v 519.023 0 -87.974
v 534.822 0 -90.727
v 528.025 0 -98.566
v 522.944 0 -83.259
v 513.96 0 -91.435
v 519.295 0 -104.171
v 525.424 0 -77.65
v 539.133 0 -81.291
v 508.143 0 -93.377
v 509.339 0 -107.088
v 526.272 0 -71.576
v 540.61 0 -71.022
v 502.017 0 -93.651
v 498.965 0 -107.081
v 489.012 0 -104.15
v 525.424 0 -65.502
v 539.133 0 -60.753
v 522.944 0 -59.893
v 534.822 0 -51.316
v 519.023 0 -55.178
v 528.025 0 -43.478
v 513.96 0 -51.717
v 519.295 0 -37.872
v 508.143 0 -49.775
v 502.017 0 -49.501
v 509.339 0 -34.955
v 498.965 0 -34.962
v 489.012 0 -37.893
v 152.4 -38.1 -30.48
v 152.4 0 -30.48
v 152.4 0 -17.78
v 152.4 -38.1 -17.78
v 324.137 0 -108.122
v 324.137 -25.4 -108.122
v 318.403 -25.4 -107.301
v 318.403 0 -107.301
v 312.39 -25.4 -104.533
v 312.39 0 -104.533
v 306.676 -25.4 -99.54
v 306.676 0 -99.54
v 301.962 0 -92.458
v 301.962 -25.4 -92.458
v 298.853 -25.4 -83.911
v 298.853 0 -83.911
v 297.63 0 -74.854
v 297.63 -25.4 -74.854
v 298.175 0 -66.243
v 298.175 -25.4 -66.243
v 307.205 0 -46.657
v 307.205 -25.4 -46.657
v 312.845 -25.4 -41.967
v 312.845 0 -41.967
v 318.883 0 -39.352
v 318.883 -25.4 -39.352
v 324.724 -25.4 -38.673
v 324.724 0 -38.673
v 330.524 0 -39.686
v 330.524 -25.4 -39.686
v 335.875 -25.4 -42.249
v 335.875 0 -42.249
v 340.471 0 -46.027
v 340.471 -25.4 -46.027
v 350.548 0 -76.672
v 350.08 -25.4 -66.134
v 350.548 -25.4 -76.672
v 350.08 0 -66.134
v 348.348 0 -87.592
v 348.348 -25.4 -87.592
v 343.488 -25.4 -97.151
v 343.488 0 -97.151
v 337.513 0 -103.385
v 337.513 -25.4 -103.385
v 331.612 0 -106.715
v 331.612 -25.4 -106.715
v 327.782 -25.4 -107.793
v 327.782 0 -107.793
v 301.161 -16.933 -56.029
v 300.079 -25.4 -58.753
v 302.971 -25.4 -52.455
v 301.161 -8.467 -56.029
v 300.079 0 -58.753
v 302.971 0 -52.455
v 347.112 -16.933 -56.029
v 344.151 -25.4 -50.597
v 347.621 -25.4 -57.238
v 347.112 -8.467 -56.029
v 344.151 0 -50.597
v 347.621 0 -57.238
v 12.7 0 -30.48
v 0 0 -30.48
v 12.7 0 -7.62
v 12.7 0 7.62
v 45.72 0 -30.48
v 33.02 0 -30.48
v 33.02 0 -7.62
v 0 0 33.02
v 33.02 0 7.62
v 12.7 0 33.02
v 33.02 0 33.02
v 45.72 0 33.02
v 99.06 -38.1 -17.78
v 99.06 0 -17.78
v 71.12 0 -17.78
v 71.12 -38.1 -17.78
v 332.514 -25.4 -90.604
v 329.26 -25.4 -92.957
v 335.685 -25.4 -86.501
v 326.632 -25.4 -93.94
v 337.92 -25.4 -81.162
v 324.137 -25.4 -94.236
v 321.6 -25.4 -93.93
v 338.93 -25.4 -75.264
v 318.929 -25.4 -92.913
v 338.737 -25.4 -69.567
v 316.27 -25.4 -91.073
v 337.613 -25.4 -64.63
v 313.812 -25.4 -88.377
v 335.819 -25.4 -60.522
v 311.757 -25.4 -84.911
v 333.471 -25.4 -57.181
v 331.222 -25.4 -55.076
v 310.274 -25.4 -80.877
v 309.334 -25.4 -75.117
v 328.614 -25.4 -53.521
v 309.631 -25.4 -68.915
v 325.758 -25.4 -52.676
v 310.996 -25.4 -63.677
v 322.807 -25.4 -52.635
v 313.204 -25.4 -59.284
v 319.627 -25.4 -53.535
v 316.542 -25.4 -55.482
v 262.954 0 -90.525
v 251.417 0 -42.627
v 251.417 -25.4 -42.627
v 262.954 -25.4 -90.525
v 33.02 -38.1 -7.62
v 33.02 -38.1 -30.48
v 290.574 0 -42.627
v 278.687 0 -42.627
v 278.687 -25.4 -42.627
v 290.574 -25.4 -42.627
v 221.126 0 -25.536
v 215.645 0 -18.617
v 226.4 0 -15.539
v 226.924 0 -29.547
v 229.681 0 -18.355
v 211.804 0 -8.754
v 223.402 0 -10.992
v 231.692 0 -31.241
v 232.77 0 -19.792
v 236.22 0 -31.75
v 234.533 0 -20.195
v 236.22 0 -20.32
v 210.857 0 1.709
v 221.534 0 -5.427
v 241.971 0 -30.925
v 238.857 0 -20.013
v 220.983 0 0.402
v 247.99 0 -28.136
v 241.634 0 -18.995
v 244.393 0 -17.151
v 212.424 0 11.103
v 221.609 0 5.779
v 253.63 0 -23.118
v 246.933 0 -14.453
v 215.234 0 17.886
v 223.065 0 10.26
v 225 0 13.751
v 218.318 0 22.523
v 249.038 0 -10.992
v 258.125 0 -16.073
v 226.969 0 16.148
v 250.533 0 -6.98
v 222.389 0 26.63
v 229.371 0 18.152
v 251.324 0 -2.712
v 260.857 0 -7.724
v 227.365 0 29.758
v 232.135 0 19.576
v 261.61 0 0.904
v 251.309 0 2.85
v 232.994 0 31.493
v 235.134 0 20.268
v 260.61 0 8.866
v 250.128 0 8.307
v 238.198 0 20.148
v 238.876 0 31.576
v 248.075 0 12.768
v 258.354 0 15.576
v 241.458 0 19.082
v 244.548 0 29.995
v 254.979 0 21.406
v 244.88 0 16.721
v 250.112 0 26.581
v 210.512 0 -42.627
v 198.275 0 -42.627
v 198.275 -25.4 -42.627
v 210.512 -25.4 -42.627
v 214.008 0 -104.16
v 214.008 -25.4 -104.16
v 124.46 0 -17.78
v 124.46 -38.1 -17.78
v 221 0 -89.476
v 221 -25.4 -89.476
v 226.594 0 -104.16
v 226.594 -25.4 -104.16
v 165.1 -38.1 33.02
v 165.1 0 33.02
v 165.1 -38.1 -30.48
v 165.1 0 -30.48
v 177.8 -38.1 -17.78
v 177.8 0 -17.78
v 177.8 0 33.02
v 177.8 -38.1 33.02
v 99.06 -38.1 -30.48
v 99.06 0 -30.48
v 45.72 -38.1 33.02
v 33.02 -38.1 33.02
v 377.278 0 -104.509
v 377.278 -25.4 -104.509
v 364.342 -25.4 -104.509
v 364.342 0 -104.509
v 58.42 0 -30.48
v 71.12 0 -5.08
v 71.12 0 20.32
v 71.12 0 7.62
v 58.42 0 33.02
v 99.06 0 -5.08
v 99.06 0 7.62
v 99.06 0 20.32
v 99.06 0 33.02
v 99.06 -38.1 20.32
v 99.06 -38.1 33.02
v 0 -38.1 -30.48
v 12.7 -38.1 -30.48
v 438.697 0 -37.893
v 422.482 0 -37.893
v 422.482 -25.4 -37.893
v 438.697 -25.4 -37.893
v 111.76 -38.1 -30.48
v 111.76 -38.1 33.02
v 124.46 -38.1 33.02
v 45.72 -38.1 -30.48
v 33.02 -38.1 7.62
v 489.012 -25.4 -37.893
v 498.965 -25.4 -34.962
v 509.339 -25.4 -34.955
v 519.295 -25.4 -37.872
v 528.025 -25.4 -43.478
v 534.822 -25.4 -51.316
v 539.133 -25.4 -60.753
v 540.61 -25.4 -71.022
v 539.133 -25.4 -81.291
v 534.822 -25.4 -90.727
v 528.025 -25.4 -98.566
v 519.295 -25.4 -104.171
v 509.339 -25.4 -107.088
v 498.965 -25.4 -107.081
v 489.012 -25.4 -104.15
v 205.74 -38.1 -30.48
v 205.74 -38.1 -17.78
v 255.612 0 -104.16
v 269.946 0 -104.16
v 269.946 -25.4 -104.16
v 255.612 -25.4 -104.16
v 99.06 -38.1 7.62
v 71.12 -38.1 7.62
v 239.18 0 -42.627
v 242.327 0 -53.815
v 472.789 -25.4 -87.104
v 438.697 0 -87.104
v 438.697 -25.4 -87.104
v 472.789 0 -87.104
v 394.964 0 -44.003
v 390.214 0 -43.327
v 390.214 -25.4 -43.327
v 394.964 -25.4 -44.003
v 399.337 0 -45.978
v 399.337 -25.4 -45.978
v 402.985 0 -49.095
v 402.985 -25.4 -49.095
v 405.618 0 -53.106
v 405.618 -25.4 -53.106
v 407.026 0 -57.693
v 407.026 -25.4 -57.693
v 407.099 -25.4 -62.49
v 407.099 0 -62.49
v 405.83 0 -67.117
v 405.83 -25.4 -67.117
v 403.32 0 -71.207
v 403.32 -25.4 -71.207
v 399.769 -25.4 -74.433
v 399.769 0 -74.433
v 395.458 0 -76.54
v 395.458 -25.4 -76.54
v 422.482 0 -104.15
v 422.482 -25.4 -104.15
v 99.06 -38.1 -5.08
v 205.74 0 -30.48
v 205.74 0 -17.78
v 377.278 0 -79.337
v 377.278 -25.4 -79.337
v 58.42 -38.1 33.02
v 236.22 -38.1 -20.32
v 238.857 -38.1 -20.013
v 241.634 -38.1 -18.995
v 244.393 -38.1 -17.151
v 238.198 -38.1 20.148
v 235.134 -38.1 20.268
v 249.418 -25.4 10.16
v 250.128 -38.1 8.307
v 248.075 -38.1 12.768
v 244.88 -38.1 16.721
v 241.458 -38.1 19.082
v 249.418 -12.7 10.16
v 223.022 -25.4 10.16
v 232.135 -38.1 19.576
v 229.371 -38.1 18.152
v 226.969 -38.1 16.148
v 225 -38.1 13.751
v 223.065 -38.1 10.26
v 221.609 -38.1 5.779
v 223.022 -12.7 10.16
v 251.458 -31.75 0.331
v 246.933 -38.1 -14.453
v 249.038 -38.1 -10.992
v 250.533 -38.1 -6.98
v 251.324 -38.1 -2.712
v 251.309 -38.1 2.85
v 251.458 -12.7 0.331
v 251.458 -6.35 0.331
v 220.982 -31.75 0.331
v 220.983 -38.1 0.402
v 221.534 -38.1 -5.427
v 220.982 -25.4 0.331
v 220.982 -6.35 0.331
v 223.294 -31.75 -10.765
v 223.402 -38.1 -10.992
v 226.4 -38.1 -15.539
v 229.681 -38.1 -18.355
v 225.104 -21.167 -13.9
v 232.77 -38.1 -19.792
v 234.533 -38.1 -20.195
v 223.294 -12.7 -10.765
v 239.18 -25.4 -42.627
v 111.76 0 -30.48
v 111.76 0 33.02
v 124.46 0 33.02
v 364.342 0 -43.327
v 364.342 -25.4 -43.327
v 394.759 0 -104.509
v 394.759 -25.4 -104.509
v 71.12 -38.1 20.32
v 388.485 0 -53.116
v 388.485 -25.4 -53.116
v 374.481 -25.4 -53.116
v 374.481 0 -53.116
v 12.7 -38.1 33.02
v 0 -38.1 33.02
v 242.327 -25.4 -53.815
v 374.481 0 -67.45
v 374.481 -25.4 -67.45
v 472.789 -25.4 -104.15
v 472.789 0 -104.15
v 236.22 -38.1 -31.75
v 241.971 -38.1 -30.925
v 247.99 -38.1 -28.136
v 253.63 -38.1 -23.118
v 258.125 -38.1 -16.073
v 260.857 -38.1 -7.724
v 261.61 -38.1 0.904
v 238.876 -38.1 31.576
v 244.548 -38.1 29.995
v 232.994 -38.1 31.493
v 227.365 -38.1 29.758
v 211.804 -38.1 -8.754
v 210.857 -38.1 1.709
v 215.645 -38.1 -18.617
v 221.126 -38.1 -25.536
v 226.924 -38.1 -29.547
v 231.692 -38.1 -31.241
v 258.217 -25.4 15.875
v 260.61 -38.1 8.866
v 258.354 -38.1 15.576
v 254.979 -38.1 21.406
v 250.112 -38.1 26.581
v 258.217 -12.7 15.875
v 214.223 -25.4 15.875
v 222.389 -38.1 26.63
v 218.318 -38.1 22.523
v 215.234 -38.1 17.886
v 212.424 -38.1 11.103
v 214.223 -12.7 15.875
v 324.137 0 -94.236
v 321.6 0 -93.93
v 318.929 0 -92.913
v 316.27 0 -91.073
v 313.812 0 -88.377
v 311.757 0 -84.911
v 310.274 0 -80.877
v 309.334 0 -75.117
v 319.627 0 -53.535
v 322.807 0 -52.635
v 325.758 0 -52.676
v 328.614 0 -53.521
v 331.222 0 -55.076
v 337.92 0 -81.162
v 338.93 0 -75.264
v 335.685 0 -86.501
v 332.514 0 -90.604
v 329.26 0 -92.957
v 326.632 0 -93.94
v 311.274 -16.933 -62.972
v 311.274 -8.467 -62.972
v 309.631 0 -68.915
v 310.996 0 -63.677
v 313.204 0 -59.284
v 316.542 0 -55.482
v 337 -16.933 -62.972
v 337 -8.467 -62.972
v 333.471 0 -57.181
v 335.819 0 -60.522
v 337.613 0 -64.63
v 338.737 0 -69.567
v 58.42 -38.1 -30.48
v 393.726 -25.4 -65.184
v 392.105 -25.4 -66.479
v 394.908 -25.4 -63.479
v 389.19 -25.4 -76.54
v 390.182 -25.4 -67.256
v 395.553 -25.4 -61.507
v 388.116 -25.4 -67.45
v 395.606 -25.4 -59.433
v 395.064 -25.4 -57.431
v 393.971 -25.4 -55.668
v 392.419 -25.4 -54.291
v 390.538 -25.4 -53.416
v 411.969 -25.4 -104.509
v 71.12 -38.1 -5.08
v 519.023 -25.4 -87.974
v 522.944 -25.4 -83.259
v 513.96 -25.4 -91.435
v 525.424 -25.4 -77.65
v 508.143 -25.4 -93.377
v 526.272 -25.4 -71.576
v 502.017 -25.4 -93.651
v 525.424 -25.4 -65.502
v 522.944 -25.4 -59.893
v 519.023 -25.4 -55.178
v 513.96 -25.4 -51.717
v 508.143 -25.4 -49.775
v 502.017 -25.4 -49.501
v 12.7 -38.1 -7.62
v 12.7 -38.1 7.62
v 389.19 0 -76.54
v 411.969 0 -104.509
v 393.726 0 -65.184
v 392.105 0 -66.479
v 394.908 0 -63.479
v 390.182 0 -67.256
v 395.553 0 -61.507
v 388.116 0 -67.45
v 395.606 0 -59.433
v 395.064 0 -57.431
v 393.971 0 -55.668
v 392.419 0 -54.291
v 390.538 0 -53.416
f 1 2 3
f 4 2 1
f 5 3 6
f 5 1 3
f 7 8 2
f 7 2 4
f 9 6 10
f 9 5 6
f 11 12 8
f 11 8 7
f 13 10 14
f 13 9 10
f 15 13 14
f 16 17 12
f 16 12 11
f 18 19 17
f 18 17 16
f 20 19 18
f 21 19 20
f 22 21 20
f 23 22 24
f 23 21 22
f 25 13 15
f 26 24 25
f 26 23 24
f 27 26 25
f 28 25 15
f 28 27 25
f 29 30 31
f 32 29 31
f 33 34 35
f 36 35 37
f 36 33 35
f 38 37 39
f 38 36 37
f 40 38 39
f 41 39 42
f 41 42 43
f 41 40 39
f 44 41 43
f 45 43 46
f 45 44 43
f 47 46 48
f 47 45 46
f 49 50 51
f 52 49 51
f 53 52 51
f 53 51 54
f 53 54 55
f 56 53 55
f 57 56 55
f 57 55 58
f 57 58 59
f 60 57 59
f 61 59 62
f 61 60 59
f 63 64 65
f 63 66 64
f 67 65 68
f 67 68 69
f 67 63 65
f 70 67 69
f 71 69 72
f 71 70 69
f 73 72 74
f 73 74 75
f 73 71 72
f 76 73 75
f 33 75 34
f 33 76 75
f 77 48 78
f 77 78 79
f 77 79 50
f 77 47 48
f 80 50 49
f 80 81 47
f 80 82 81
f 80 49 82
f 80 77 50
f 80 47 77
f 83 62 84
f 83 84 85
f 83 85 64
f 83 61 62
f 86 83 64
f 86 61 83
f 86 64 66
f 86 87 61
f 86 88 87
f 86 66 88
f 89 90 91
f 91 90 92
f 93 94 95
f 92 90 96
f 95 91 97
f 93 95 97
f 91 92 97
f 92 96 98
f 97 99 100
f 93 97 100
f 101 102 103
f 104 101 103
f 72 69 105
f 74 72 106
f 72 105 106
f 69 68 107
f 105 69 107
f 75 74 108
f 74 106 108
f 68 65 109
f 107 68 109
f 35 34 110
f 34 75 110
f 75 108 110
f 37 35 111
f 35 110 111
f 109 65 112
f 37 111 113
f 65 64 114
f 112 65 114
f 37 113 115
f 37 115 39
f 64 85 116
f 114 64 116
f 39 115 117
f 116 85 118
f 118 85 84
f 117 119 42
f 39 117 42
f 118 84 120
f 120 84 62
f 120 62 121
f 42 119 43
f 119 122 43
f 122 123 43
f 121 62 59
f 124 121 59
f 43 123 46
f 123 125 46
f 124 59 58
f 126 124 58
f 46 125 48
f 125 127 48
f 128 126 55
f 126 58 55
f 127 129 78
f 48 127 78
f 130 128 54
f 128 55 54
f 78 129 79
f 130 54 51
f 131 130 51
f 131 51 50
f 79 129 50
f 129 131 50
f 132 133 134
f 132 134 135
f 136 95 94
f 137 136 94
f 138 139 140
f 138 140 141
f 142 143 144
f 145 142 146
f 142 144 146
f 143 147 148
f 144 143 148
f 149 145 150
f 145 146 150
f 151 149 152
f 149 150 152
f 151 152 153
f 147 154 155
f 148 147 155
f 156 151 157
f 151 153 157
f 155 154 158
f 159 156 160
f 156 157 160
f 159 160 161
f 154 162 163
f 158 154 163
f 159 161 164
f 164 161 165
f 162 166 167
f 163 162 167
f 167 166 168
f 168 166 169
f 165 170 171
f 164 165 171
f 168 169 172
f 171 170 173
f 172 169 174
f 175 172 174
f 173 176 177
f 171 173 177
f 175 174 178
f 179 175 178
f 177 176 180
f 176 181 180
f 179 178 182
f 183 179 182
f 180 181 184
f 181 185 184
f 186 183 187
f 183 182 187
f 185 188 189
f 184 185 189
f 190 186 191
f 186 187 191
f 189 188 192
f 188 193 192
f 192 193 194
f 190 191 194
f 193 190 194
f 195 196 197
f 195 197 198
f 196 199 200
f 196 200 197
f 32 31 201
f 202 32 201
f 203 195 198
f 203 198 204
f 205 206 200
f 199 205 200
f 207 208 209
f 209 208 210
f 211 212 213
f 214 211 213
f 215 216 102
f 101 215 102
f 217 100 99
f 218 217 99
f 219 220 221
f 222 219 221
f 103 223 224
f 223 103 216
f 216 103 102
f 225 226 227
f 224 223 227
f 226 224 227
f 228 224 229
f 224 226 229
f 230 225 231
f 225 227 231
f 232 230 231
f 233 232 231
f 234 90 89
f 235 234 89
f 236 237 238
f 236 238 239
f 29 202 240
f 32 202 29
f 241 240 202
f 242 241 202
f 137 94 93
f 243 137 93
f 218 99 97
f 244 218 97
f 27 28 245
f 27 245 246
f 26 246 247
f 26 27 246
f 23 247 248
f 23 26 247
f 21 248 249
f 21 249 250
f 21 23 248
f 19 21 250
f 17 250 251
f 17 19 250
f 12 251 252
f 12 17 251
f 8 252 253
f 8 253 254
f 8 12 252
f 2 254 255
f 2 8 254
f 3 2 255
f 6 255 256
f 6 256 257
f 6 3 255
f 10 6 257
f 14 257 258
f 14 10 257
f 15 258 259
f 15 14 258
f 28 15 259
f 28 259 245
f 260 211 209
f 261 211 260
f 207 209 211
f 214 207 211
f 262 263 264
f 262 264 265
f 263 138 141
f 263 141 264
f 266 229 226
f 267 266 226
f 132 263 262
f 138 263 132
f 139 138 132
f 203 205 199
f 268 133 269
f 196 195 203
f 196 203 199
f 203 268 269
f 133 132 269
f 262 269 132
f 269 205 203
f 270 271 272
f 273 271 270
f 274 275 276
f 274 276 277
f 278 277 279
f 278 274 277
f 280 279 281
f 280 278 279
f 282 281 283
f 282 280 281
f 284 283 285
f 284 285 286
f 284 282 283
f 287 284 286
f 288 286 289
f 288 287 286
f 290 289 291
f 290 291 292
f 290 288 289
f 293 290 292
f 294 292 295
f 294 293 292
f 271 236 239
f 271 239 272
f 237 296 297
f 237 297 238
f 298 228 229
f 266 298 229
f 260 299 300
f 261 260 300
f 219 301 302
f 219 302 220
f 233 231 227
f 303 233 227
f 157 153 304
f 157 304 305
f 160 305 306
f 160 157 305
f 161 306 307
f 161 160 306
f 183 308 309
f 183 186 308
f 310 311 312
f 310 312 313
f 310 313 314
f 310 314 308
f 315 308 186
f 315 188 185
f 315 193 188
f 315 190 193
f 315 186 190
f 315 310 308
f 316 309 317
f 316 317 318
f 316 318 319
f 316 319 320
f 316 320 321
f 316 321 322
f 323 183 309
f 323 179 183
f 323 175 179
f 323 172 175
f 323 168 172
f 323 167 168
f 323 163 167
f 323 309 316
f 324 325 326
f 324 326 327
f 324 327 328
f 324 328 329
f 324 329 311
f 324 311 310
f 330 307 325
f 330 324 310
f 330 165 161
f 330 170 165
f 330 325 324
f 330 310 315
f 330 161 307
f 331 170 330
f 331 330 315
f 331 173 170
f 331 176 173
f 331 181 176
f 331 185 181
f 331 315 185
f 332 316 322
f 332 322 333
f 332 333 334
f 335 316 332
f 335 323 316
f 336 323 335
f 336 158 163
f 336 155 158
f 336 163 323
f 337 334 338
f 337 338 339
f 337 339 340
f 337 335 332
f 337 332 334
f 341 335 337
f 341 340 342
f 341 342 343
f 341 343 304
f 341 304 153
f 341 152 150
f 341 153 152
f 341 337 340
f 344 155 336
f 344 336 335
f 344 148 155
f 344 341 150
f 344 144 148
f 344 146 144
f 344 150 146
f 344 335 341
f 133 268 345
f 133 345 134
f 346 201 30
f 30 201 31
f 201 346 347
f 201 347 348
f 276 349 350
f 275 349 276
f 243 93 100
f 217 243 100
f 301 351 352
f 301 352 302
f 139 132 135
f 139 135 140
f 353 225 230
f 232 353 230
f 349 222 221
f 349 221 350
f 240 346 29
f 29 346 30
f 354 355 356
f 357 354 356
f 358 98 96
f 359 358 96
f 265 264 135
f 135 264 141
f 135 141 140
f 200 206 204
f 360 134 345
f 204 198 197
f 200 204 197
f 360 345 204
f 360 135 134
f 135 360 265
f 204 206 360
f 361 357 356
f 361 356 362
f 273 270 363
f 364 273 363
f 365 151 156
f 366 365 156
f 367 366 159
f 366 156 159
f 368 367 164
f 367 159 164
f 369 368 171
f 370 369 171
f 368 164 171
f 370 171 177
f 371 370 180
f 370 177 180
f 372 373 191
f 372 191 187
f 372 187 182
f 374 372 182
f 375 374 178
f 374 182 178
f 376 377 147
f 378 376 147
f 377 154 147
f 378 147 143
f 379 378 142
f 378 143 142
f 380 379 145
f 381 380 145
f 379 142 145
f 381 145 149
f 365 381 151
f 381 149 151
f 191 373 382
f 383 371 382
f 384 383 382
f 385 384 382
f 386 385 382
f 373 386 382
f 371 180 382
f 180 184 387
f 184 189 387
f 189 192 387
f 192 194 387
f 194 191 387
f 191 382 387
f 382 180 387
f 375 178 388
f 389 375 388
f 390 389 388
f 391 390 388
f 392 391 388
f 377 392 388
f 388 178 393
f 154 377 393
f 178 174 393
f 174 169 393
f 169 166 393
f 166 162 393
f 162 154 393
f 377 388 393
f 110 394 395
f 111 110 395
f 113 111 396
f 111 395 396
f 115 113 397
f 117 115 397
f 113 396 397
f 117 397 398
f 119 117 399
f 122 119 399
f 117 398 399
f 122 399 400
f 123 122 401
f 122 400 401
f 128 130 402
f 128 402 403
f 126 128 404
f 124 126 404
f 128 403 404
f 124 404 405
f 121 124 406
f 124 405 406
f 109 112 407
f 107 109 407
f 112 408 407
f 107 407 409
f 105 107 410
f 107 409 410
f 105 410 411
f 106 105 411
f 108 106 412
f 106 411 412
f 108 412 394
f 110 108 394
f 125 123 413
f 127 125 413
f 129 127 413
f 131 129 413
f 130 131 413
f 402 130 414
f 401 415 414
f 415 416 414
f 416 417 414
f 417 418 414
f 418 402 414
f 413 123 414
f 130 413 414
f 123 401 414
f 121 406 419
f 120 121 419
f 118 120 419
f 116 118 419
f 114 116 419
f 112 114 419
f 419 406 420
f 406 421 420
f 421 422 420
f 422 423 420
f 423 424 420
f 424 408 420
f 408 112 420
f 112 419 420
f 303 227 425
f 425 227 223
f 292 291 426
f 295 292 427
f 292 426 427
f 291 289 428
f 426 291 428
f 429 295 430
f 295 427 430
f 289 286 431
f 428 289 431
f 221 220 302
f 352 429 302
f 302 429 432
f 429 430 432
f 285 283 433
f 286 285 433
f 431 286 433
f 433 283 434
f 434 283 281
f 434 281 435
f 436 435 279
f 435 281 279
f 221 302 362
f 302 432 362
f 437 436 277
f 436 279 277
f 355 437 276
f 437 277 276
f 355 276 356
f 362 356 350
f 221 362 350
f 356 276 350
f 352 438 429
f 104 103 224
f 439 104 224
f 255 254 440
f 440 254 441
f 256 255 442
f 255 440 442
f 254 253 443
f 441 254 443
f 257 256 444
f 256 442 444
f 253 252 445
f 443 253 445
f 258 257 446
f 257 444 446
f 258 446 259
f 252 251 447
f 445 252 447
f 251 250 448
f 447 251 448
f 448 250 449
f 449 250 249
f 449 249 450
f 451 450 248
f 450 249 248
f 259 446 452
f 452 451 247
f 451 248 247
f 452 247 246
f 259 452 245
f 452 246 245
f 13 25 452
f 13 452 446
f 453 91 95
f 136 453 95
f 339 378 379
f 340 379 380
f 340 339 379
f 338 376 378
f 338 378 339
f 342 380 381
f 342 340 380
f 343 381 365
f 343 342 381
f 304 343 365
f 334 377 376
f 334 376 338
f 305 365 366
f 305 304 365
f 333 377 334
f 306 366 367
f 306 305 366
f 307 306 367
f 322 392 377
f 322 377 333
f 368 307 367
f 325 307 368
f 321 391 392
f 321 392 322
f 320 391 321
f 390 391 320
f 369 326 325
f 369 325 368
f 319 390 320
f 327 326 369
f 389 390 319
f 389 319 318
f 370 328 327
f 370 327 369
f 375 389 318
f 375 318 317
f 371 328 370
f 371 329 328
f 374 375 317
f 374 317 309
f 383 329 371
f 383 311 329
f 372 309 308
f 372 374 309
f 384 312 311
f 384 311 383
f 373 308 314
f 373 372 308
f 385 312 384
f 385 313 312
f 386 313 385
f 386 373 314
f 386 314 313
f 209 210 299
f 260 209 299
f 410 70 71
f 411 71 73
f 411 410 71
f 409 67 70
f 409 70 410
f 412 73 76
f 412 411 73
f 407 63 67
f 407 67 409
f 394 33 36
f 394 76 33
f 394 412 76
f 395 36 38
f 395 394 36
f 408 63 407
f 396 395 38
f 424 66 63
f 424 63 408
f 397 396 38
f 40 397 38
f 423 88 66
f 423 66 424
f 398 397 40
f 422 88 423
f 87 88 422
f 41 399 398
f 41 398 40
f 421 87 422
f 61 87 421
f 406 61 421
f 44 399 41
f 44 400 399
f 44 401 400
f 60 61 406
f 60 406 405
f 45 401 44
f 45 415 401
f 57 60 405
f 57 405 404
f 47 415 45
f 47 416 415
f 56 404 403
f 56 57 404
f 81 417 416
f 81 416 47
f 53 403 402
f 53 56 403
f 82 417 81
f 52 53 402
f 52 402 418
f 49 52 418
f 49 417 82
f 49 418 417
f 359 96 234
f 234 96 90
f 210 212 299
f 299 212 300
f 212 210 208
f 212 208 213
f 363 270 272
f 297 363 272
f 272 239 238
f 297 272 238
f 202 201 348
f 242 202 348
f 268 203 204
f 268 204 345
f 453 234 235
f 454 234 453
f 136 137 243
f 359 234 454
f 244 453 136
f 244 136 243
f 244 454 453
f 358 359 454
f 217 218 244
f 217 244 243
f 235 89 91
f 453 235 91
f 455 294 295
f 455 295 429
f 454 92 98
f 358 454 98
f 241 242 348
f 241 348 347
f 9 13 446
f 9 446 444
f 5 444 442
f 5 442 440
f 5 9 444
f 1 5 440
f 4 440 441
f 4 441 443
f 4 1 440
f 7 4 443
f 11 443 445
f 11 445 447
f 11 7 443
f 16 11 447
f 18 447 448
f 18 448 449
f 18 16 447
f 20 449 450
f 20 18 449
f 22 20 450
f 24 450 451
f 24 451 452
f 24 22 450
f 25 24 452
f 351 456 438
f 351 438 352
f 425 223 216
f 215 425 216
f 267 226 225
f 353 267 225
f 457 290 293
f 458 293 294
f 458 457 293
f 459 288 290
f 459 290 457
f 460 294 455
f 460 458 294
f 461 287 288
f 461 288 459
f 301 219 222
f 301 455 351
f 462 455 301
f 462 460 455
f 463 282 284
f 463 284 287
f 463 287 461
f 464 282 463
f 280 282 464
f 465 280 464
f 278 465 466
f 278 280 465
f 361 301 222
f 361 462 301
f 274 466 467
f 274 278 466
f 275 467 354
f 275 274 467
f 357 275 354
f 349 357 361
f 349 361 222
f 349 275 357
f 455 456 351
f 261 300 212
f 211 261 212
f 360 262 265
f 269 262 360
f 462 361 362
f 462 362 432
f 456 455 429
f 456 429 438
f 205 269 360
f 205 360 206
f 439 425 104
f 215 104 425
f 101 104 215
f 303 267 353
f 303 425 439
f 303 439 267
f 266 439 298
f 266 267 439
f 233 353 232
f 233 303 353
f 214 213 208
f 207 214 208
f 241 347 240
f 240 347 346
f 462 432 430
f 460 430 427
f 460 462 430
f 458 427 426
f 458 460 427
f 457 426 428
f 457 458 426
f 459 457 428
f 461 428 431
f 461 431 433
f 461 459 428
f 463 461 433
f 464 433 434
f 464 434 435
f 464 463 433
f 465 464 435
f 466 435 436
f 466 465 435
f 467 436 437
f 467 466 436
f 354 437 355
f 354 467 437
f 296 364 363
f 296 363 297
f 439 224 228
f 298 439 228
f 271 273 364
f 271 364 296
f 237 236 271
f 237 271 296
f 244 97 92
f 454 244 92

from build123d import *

# Parameters (mm, degrees)
F1_DEPTH = 38.1
F3_DEPTH = 25.4


with BuildPart() as f1:
    # F0 (on Front) → F1 (new body)
    with BuildSketch(Plane.XZ):
        Polygon((0, 33.02), (0, 0), (0, -30.48), (12.7, -30.48), (12.7, -7.62), (33.02, -7.62), (33.02, -30.48), (45.72, -30.48), (45.72, 33.02), (33.02, 33.02), (33.02, 7.62), (12.7, 7.62), (12.7, 33.02), align=None)
        Polygon((99.06, 33.02), (58.42, 33.02), (58.42, -30.48), (99.06, -30.48), (99.06, -17.78), (71.12, -17.78), (71.12, -5.08), (99.06, -5.08), (99.06, 7.62), (71.12, 7.62), (71.12, 20.32), (99.06, 20.32), align=None)
        Polygon((124.46, 33.02), (111.76, 33.02), (111.76, -30.48), (152.4, -30.48), (152.4, -17.78), (124.46, -17.78), align=None)
        Polygon((177.8, 33.02), (165.1, 33.02), (165.1, -30.48), (205.74, -30.48), (205.74, -17.78), (177.8, -17.78), align=None)
        with BuildLine():
            add(Edge.make_bspline(
                [(236.22, -31.75), (280.214091, -31.75), (258.217045, 15.875), (236.22, 63.5), (214.222955, 15.875), (192.225909, -31.75), (236.22, -31.75)],
                knots=[0, 0, 0, 2.094395, 2.094395, 4.18879, 4.18879, 6.283185, 6.283185, 6.283185], degree=2, weights=[1, 0.5, 1, 0.5, 1, 0.5, 1]))
        make_face()
        with BuildLine():
            add(Edge.make_bspline(
                [(236.22, -20.32), (262.616454, -20.32), (249.418227, 10.16), (236.22, 40.64), (223.021773, 10.16), (209.823546, -20.32), (236.22, -20.32)],
                knots=[0, 0, 0, 2.094395, 2.094395, 4.18879, 4.18879, 6.283185, 6.283185, 6.283185], degree=2, weights=[1, 0.5, 1, 0.5, 1, 0.5, 1]))
        make_face(mode=Mode.SUBTRACT)
    extrude(amount=F1_DEPTH)


with BuildPart() as f3:
    # F2 (on face) → F3 (new body)
    with BuildSketch(Plane(origin=(0, 0, 0), x_dir=(-1, 0, 0), z_dir=(0, 1, 0))):
        Polygon((-221.00015, -89.475729), (-239.180148, -42.627271), (-251.416683, -42.627271), (-262.953997, -90.524577), (-278.686672, -42.627271), (-290.573597, -42.627271), (-269.946307, -104.159579), (-255.612075, -104.159579), (-242.326677, -53.814963), (-226.593986, -104.159579), (-214.00784, -104.159579), (-198.275149, -42.627271), (-210.511684, -42.627271), align=None)
        with BuildLine():
            add(Edge.make_bspline(
                [(-324.136645, -108.12219), (-278.185612, -108.12219), (-301.161128, -56.029051), (-324.136645, -3.935912), (-347.112161, -56.029051), (-370.087677, -108.12219), (-324.136645, -108.12219)],
                knots=[0, 0, 0, 2.094395, 2.094395, 4.18879, 4.18879, 6.283185, 6.283185, 6.283185], degree=2, weights=[1, 0.5, 1, 0.5, 1, 0.5, 1]))
        make_face()
        with BuildLine():
            add(Edge.make_bspline(
                [(-324.136645, -94.235838), (-298.410419, -94.235838), (-311.273532, -62.972227), (-324.136645, -31.708615), (-336.999757, -62.972227), (-349.86287, -94.235838), (-324.136645, -94.235838)],
                knots=[0, 0, 0, 2.094395, 2.094395, 4.18879, 4.18879, 6.283185, 6.283185, 6.283185], degree=2, weights=[1, 0.5, 1, 0.5, 1, 0.5, 1]))
        make_face(mode=Mode.SUBTRACT)
        with BuildLine():
            Line((-364.342421, -104.509197), (-364.342421, -43.326508))
            Line((-364.342421, -43.326508), (-390.213966, -43.326508))
            ThreePointArc((-390.213966, -43.326508), (-407.026428, -57.692656), (-395.458192, -76.539963))
            Line((-395.458192, -76.539963), (-389.190345, -76.539963))
            Line((-389.190345, -76.539963), (-411.969401, -104.509197))
            Line((-411.969401, -104.509197), (-394.75897, -104.509197))
            Line((-394.75897, -104.509197), (-377.278209, -79.336889))
            Line((-377.278209, -79.336889), (-377.278209, -104.509197))
            Line((-377.278209, -104.509197), (-364.342421, -104.509197))
        make_face()
        with BuildLine():
            Line((-388.485349, -53.115737), (-374.481291, -53.115737))
            Line((-374.481291, -53.115737), (-374.481291, -67.449965))
            Line((-374.481291, -67.449965), (-388.11627, -67.449965))
            ThreePointArc((-388.11627, -67.449965), (-395.654838, -60.472203), (-388.485349, -53.115737))
        make_face(mode=Mode.SUBTRACT)
        Polygon((-422.481775, -104.150489), (-422.481775, -37.892681), (-438.696623, -37.892681), (-438.696623, -87.104119), (-472.789347, -87.104119), (-472.789347, -104.150489), align=None)
        with BuildLine():
            Line((-489.012493, -104.150489), (-489.012493, -37.892681))
            ThreePointArc((-489.012493, -37.892681), (-540.610484, -71.021585), (-489.012493, -104.150489))
        make_face()
        with BuildLine():
            ThreePointArc((-502.016574, -93.650766), (-526.271804, -71.576048), (-502.016574, -49.501329))
            Line((-502.016574, -49.501329), (-502.016574, -93.650766))
        make_face(mode=Mode.SUBTRACT)
    extrude(amount=-F3_DEPTH)


solid = Compound([f1.part, f3.part])
